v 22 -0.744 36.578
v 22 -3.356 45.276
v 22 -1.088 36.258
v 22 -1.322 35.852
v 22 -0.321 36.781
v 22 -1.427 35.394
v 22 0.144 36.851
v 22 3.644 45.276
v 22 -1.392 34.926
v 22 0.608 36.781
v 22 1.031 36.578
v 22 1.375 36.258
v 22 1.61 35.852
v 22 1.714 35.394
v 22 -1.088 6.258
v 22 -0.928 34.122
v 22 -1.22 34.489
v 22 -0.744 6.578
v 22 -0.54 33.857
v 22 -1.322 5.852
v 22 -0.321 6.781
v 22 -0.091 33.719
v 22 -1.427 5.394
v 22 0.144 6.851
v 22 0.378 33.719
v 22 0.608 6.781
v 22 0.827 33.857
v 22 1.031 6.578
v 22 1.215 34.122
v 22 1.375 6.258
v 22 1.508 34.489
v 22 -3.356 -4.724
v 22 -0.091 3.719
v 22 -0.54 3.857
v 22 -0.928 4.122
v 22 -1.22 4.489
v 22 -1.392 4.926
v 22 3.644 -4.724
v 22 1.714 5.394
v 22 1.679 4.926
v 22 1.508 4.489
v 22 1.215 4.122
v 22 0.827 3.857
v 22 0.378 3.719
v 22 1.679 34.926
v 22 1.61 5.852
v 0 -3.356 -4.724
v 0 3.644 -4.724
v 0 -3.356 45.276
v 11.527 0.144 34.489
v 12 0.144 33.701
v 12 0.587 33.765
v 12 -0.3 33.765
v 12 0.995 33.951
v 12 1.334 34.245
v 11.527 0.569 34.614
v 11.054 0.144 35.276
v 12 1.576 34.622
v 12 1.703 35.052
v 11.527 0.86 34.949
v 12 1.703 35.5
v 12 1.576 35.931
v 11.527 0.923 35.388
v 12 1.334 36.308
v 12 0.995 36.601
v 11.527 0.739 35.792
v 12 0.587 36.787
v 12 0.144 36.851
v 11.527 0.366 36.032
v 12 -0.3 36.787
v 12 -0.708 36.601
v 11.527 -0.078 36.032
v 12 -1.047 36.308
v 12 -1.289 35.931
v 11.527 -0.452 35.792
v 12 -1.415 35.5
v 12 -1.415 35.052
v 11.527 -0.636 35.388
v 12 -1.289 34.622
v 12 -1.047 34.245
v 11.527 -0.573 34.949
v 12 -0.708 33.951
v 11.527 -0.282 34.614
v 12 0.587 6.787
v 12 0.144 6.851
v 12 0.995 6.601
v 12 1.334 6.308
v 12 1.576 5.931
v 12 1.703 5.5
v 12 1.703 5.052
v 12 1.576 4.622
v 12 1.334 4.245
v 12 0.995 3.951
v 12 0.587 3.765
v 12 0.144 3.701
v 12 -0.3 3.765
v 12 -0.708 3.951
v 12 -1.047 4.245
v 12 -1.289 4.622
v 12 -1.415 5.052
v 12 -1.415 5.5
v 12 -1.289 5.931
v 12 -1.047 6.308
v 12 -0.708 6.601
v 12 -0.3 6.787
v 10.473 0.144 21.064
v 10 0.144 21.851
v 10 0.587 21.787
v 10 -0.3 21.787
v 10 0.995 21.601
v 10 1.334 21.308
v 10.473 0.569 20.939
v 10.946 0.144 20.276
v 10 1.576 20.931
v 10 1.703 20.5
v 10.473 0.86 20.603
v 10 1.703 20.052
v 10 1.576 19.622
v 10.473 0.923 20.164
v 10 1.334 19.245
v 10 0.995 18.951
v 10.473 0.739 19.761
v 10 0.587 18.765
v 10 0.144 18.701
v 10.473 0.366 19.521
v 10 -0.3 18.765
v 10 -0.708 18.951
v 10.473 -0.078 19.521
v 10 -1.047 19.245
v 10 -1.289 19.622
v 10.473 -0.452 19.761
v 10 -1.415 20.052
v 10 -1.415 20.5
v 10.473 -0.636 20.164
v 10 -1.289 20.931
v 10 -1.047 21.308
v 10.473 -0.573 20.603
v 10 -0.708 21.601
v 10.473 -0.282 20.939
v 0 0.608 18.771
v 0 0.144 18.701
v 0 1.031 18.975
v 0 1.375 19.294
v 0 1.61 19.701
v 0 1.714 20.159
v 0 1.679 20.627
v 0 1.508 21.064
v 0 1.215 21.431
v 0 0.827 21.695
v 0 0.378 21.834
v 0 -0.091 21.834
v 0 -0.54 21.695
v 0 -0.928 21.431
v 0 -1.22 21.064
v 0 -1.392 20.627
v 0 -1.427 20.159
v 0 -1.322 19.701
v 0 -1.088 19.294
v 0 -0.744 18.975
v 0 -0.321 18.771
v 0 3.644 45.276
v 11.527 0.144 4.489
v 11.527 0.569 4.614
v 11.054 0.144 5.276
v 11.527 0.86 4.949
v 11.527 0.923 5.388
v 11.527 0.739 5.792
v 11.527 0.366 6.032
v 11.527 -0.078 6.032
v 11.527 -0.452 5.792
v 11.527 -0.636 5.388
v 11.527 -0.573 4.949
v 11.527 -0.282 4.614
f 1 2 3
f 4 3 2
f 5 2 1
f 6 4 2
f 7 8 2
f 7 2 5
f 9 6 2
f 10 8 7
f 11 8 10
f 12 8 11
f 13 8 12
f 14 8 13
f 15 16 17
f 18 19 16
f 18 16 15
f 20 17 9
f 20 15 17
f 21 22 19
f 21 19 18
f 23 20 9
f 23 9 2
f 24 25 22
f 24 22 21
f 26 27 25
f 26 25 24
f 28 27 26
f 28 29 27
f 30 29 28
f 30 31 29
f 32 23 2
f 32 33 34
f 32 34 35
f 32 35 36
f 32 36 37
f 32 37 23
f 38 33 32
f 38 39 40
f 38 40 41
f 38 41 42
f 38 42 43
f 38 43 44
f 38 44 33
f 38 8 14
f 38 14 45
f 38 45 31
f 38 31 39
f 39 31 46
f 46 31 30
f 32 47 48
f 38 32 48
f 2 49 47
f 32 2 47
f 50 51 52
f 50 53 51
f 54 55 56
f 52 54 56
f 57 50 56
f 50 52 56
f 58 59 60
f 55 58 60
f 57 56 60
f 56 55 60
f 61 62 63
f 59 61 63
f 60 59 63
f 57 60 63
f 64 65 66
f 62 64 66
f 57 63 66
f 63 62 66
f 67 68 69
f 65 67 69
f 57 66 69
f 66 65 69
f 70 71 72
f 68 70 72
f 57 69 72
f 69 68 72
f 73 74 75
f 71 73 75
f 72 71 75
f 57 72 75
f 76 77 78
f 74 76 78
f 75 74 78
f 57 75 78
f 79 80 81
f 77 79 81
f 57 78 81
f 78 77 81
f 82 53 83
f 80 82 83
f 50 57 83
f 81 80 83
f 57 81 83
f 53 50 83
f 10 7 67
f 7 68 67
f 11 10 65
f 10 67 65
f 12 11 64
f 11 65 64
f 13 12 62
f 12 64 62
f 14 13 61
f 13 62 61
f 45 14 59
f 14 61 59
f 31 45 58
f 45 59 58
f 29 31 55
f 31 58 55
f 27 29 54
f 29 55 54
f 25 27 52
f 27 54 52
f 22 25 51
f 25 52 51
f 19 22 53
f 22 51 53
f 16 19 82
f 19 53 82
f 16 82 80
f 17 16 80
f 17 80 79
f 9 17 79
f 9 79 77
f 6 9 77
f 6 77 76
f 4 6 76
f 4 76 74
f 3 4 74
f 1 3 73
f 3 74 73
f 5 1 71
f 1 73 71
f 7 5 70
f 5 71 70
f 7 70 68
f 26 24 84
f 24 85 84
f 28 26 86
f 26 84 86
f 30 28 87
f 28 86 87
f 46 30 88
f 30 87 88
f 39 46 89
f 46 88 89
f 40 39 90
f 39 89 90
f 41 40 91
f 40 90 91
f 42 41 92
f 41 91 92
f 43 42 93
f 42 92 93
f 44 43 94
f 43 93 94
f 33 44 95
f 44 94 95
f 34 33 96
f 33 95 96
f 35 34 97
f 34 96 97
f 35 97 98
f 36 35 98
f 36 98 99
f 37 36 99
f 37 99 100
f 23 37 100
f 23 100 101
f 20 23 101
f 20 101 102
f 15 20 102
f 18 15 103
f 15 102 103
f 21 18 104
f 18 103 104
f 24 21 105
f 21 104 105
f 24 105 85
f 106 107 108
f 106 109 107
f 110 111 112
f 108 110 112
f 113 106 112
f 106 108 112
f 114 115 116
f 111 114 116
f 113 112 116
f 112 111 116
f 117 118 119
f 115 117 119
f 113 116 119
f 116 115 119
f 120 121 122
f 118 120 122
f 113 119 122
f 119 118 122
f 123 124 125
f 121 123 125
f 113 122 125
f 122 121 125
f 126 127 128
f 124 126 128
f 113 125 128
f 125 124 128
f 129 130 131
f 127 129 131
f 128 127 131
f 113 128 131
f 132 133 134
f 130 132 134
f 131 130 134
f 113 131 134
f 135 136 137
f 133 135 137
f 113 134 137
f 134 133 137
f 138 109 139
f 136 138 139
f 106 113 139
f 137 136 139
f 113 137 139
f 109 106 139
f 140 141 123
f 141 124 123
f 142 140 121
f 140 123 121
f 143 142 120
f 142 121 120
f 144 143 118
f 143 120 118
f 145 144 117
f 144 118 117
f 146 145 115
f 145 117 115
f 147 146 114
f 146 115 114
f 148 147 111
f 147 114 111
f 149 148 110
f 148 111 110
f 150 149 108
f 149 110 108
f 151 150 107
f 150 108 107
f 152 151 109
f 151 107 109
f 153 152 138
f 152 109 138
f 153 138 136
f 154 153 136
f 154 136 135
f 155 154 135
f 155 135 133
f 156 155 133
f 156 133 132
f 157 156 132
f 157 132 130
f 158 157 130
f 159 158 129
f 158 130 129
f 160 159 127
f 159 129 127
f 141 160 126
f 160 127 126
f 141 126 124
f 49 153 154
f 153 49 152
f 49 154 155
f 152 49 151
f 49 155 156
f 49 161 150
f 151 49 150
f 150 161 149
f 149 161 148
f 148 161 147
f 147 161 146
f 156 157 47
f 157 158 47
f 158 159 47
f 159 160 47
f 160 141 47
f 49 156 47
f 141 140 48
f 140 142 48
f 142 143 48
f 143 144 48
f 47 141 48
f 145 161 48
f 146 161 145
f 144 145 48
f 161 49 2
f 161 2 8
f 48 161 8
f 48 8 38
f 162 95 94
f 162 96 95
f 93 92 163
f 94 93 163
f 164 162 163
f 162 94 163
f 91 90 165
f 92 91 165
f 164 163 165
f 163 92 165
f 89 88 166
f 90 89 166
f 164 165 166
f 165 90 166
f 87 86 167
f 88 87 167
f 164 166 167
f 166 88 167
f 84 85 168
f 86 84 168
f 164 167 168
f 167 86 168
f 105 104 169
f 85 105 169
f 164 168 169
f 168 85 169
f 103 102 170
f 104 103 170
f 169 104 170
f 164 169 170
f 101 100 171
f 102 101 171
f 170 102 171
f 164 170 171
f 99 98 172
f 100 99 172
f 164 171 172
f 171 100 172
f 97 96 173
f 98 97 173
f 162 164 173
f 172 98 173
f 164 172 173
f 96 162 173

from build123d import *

# Parameters (mm, degrees)
SKETCH_1_W            = 50
SKETCH_1_H            = 7
EXTRUDE_1_DEPTH       = 22
HOLE_WIZARD_M31_D     = 3.15
HOLE_WIZARD_M31_DEPTH = 10
HOLE_WIZARD_M31_TIP   = 0.946355475
HOLE_WIZARD_M32_D     = 3.15
HOLE_WIZARD_M32_DEPTH = 10
HOLE_WIZARD_M32_TIP   = 0.946355475


with BuildPart() as part:
    # Эскиз1 → Бобышка-Вытянуть1 (new body)
    with BuildSketch(Plane(origin=(0, 0, 0), x_dir=(0, 0, -1), z_dir=(1, 0, 0))):
        with Locations((-20.27623422, 0.143640104)):
            Rectangle(SKETCH_1_W, SKETCH_1_H)
    extrude(amount=EXTRUDE_1_DEPTH)

    # Сверло под метчик  спиральное M31
    with Locations(Plane(origin=(22, 0, 0), x_dir=(0, 0, -1), z_dir=(1, 0, 0))):
        with Locations((-35.27623422, 0.143640104), (-5.27623422, 0.143640104)):
            Hole(HOLE_WIZARD_M31_D / 2, depth=HOLE_WIZARD_M31_DEPTH)
            with Locations((0, 0, -(HOLE_WIZARD_M31_DEPTH + HOLE_WIZARD_M31_TIP / 2))):  # 118° drill point
                Cone(0, HOLE_WIZARD_M31_D / 2, HOLE_WIZARD_M31_TIP, mode=Mode.SUBTRACT)

    # Сверло под метчик  спиральное M32
    with Locations(Plane.ZY):
        with Locations((20.27623422, 0.143640104)):
            Hole(HOLE_WIZARD_M32_D / 2, depth=HOLE_WIZARD_M32_DEPTH)
            with Locations((0, 0, -(HOLE_WIZARD_M32_DEPTH + HOLE_WIZARD_M32_TIP / 2))):  # 118° drill point
                Cone(0, HOLE_WIZARD_M32_D / 2, HOLE_WIZARD_M32_TIP, mode=Mode.SUBTRACT)


solid = part.part
